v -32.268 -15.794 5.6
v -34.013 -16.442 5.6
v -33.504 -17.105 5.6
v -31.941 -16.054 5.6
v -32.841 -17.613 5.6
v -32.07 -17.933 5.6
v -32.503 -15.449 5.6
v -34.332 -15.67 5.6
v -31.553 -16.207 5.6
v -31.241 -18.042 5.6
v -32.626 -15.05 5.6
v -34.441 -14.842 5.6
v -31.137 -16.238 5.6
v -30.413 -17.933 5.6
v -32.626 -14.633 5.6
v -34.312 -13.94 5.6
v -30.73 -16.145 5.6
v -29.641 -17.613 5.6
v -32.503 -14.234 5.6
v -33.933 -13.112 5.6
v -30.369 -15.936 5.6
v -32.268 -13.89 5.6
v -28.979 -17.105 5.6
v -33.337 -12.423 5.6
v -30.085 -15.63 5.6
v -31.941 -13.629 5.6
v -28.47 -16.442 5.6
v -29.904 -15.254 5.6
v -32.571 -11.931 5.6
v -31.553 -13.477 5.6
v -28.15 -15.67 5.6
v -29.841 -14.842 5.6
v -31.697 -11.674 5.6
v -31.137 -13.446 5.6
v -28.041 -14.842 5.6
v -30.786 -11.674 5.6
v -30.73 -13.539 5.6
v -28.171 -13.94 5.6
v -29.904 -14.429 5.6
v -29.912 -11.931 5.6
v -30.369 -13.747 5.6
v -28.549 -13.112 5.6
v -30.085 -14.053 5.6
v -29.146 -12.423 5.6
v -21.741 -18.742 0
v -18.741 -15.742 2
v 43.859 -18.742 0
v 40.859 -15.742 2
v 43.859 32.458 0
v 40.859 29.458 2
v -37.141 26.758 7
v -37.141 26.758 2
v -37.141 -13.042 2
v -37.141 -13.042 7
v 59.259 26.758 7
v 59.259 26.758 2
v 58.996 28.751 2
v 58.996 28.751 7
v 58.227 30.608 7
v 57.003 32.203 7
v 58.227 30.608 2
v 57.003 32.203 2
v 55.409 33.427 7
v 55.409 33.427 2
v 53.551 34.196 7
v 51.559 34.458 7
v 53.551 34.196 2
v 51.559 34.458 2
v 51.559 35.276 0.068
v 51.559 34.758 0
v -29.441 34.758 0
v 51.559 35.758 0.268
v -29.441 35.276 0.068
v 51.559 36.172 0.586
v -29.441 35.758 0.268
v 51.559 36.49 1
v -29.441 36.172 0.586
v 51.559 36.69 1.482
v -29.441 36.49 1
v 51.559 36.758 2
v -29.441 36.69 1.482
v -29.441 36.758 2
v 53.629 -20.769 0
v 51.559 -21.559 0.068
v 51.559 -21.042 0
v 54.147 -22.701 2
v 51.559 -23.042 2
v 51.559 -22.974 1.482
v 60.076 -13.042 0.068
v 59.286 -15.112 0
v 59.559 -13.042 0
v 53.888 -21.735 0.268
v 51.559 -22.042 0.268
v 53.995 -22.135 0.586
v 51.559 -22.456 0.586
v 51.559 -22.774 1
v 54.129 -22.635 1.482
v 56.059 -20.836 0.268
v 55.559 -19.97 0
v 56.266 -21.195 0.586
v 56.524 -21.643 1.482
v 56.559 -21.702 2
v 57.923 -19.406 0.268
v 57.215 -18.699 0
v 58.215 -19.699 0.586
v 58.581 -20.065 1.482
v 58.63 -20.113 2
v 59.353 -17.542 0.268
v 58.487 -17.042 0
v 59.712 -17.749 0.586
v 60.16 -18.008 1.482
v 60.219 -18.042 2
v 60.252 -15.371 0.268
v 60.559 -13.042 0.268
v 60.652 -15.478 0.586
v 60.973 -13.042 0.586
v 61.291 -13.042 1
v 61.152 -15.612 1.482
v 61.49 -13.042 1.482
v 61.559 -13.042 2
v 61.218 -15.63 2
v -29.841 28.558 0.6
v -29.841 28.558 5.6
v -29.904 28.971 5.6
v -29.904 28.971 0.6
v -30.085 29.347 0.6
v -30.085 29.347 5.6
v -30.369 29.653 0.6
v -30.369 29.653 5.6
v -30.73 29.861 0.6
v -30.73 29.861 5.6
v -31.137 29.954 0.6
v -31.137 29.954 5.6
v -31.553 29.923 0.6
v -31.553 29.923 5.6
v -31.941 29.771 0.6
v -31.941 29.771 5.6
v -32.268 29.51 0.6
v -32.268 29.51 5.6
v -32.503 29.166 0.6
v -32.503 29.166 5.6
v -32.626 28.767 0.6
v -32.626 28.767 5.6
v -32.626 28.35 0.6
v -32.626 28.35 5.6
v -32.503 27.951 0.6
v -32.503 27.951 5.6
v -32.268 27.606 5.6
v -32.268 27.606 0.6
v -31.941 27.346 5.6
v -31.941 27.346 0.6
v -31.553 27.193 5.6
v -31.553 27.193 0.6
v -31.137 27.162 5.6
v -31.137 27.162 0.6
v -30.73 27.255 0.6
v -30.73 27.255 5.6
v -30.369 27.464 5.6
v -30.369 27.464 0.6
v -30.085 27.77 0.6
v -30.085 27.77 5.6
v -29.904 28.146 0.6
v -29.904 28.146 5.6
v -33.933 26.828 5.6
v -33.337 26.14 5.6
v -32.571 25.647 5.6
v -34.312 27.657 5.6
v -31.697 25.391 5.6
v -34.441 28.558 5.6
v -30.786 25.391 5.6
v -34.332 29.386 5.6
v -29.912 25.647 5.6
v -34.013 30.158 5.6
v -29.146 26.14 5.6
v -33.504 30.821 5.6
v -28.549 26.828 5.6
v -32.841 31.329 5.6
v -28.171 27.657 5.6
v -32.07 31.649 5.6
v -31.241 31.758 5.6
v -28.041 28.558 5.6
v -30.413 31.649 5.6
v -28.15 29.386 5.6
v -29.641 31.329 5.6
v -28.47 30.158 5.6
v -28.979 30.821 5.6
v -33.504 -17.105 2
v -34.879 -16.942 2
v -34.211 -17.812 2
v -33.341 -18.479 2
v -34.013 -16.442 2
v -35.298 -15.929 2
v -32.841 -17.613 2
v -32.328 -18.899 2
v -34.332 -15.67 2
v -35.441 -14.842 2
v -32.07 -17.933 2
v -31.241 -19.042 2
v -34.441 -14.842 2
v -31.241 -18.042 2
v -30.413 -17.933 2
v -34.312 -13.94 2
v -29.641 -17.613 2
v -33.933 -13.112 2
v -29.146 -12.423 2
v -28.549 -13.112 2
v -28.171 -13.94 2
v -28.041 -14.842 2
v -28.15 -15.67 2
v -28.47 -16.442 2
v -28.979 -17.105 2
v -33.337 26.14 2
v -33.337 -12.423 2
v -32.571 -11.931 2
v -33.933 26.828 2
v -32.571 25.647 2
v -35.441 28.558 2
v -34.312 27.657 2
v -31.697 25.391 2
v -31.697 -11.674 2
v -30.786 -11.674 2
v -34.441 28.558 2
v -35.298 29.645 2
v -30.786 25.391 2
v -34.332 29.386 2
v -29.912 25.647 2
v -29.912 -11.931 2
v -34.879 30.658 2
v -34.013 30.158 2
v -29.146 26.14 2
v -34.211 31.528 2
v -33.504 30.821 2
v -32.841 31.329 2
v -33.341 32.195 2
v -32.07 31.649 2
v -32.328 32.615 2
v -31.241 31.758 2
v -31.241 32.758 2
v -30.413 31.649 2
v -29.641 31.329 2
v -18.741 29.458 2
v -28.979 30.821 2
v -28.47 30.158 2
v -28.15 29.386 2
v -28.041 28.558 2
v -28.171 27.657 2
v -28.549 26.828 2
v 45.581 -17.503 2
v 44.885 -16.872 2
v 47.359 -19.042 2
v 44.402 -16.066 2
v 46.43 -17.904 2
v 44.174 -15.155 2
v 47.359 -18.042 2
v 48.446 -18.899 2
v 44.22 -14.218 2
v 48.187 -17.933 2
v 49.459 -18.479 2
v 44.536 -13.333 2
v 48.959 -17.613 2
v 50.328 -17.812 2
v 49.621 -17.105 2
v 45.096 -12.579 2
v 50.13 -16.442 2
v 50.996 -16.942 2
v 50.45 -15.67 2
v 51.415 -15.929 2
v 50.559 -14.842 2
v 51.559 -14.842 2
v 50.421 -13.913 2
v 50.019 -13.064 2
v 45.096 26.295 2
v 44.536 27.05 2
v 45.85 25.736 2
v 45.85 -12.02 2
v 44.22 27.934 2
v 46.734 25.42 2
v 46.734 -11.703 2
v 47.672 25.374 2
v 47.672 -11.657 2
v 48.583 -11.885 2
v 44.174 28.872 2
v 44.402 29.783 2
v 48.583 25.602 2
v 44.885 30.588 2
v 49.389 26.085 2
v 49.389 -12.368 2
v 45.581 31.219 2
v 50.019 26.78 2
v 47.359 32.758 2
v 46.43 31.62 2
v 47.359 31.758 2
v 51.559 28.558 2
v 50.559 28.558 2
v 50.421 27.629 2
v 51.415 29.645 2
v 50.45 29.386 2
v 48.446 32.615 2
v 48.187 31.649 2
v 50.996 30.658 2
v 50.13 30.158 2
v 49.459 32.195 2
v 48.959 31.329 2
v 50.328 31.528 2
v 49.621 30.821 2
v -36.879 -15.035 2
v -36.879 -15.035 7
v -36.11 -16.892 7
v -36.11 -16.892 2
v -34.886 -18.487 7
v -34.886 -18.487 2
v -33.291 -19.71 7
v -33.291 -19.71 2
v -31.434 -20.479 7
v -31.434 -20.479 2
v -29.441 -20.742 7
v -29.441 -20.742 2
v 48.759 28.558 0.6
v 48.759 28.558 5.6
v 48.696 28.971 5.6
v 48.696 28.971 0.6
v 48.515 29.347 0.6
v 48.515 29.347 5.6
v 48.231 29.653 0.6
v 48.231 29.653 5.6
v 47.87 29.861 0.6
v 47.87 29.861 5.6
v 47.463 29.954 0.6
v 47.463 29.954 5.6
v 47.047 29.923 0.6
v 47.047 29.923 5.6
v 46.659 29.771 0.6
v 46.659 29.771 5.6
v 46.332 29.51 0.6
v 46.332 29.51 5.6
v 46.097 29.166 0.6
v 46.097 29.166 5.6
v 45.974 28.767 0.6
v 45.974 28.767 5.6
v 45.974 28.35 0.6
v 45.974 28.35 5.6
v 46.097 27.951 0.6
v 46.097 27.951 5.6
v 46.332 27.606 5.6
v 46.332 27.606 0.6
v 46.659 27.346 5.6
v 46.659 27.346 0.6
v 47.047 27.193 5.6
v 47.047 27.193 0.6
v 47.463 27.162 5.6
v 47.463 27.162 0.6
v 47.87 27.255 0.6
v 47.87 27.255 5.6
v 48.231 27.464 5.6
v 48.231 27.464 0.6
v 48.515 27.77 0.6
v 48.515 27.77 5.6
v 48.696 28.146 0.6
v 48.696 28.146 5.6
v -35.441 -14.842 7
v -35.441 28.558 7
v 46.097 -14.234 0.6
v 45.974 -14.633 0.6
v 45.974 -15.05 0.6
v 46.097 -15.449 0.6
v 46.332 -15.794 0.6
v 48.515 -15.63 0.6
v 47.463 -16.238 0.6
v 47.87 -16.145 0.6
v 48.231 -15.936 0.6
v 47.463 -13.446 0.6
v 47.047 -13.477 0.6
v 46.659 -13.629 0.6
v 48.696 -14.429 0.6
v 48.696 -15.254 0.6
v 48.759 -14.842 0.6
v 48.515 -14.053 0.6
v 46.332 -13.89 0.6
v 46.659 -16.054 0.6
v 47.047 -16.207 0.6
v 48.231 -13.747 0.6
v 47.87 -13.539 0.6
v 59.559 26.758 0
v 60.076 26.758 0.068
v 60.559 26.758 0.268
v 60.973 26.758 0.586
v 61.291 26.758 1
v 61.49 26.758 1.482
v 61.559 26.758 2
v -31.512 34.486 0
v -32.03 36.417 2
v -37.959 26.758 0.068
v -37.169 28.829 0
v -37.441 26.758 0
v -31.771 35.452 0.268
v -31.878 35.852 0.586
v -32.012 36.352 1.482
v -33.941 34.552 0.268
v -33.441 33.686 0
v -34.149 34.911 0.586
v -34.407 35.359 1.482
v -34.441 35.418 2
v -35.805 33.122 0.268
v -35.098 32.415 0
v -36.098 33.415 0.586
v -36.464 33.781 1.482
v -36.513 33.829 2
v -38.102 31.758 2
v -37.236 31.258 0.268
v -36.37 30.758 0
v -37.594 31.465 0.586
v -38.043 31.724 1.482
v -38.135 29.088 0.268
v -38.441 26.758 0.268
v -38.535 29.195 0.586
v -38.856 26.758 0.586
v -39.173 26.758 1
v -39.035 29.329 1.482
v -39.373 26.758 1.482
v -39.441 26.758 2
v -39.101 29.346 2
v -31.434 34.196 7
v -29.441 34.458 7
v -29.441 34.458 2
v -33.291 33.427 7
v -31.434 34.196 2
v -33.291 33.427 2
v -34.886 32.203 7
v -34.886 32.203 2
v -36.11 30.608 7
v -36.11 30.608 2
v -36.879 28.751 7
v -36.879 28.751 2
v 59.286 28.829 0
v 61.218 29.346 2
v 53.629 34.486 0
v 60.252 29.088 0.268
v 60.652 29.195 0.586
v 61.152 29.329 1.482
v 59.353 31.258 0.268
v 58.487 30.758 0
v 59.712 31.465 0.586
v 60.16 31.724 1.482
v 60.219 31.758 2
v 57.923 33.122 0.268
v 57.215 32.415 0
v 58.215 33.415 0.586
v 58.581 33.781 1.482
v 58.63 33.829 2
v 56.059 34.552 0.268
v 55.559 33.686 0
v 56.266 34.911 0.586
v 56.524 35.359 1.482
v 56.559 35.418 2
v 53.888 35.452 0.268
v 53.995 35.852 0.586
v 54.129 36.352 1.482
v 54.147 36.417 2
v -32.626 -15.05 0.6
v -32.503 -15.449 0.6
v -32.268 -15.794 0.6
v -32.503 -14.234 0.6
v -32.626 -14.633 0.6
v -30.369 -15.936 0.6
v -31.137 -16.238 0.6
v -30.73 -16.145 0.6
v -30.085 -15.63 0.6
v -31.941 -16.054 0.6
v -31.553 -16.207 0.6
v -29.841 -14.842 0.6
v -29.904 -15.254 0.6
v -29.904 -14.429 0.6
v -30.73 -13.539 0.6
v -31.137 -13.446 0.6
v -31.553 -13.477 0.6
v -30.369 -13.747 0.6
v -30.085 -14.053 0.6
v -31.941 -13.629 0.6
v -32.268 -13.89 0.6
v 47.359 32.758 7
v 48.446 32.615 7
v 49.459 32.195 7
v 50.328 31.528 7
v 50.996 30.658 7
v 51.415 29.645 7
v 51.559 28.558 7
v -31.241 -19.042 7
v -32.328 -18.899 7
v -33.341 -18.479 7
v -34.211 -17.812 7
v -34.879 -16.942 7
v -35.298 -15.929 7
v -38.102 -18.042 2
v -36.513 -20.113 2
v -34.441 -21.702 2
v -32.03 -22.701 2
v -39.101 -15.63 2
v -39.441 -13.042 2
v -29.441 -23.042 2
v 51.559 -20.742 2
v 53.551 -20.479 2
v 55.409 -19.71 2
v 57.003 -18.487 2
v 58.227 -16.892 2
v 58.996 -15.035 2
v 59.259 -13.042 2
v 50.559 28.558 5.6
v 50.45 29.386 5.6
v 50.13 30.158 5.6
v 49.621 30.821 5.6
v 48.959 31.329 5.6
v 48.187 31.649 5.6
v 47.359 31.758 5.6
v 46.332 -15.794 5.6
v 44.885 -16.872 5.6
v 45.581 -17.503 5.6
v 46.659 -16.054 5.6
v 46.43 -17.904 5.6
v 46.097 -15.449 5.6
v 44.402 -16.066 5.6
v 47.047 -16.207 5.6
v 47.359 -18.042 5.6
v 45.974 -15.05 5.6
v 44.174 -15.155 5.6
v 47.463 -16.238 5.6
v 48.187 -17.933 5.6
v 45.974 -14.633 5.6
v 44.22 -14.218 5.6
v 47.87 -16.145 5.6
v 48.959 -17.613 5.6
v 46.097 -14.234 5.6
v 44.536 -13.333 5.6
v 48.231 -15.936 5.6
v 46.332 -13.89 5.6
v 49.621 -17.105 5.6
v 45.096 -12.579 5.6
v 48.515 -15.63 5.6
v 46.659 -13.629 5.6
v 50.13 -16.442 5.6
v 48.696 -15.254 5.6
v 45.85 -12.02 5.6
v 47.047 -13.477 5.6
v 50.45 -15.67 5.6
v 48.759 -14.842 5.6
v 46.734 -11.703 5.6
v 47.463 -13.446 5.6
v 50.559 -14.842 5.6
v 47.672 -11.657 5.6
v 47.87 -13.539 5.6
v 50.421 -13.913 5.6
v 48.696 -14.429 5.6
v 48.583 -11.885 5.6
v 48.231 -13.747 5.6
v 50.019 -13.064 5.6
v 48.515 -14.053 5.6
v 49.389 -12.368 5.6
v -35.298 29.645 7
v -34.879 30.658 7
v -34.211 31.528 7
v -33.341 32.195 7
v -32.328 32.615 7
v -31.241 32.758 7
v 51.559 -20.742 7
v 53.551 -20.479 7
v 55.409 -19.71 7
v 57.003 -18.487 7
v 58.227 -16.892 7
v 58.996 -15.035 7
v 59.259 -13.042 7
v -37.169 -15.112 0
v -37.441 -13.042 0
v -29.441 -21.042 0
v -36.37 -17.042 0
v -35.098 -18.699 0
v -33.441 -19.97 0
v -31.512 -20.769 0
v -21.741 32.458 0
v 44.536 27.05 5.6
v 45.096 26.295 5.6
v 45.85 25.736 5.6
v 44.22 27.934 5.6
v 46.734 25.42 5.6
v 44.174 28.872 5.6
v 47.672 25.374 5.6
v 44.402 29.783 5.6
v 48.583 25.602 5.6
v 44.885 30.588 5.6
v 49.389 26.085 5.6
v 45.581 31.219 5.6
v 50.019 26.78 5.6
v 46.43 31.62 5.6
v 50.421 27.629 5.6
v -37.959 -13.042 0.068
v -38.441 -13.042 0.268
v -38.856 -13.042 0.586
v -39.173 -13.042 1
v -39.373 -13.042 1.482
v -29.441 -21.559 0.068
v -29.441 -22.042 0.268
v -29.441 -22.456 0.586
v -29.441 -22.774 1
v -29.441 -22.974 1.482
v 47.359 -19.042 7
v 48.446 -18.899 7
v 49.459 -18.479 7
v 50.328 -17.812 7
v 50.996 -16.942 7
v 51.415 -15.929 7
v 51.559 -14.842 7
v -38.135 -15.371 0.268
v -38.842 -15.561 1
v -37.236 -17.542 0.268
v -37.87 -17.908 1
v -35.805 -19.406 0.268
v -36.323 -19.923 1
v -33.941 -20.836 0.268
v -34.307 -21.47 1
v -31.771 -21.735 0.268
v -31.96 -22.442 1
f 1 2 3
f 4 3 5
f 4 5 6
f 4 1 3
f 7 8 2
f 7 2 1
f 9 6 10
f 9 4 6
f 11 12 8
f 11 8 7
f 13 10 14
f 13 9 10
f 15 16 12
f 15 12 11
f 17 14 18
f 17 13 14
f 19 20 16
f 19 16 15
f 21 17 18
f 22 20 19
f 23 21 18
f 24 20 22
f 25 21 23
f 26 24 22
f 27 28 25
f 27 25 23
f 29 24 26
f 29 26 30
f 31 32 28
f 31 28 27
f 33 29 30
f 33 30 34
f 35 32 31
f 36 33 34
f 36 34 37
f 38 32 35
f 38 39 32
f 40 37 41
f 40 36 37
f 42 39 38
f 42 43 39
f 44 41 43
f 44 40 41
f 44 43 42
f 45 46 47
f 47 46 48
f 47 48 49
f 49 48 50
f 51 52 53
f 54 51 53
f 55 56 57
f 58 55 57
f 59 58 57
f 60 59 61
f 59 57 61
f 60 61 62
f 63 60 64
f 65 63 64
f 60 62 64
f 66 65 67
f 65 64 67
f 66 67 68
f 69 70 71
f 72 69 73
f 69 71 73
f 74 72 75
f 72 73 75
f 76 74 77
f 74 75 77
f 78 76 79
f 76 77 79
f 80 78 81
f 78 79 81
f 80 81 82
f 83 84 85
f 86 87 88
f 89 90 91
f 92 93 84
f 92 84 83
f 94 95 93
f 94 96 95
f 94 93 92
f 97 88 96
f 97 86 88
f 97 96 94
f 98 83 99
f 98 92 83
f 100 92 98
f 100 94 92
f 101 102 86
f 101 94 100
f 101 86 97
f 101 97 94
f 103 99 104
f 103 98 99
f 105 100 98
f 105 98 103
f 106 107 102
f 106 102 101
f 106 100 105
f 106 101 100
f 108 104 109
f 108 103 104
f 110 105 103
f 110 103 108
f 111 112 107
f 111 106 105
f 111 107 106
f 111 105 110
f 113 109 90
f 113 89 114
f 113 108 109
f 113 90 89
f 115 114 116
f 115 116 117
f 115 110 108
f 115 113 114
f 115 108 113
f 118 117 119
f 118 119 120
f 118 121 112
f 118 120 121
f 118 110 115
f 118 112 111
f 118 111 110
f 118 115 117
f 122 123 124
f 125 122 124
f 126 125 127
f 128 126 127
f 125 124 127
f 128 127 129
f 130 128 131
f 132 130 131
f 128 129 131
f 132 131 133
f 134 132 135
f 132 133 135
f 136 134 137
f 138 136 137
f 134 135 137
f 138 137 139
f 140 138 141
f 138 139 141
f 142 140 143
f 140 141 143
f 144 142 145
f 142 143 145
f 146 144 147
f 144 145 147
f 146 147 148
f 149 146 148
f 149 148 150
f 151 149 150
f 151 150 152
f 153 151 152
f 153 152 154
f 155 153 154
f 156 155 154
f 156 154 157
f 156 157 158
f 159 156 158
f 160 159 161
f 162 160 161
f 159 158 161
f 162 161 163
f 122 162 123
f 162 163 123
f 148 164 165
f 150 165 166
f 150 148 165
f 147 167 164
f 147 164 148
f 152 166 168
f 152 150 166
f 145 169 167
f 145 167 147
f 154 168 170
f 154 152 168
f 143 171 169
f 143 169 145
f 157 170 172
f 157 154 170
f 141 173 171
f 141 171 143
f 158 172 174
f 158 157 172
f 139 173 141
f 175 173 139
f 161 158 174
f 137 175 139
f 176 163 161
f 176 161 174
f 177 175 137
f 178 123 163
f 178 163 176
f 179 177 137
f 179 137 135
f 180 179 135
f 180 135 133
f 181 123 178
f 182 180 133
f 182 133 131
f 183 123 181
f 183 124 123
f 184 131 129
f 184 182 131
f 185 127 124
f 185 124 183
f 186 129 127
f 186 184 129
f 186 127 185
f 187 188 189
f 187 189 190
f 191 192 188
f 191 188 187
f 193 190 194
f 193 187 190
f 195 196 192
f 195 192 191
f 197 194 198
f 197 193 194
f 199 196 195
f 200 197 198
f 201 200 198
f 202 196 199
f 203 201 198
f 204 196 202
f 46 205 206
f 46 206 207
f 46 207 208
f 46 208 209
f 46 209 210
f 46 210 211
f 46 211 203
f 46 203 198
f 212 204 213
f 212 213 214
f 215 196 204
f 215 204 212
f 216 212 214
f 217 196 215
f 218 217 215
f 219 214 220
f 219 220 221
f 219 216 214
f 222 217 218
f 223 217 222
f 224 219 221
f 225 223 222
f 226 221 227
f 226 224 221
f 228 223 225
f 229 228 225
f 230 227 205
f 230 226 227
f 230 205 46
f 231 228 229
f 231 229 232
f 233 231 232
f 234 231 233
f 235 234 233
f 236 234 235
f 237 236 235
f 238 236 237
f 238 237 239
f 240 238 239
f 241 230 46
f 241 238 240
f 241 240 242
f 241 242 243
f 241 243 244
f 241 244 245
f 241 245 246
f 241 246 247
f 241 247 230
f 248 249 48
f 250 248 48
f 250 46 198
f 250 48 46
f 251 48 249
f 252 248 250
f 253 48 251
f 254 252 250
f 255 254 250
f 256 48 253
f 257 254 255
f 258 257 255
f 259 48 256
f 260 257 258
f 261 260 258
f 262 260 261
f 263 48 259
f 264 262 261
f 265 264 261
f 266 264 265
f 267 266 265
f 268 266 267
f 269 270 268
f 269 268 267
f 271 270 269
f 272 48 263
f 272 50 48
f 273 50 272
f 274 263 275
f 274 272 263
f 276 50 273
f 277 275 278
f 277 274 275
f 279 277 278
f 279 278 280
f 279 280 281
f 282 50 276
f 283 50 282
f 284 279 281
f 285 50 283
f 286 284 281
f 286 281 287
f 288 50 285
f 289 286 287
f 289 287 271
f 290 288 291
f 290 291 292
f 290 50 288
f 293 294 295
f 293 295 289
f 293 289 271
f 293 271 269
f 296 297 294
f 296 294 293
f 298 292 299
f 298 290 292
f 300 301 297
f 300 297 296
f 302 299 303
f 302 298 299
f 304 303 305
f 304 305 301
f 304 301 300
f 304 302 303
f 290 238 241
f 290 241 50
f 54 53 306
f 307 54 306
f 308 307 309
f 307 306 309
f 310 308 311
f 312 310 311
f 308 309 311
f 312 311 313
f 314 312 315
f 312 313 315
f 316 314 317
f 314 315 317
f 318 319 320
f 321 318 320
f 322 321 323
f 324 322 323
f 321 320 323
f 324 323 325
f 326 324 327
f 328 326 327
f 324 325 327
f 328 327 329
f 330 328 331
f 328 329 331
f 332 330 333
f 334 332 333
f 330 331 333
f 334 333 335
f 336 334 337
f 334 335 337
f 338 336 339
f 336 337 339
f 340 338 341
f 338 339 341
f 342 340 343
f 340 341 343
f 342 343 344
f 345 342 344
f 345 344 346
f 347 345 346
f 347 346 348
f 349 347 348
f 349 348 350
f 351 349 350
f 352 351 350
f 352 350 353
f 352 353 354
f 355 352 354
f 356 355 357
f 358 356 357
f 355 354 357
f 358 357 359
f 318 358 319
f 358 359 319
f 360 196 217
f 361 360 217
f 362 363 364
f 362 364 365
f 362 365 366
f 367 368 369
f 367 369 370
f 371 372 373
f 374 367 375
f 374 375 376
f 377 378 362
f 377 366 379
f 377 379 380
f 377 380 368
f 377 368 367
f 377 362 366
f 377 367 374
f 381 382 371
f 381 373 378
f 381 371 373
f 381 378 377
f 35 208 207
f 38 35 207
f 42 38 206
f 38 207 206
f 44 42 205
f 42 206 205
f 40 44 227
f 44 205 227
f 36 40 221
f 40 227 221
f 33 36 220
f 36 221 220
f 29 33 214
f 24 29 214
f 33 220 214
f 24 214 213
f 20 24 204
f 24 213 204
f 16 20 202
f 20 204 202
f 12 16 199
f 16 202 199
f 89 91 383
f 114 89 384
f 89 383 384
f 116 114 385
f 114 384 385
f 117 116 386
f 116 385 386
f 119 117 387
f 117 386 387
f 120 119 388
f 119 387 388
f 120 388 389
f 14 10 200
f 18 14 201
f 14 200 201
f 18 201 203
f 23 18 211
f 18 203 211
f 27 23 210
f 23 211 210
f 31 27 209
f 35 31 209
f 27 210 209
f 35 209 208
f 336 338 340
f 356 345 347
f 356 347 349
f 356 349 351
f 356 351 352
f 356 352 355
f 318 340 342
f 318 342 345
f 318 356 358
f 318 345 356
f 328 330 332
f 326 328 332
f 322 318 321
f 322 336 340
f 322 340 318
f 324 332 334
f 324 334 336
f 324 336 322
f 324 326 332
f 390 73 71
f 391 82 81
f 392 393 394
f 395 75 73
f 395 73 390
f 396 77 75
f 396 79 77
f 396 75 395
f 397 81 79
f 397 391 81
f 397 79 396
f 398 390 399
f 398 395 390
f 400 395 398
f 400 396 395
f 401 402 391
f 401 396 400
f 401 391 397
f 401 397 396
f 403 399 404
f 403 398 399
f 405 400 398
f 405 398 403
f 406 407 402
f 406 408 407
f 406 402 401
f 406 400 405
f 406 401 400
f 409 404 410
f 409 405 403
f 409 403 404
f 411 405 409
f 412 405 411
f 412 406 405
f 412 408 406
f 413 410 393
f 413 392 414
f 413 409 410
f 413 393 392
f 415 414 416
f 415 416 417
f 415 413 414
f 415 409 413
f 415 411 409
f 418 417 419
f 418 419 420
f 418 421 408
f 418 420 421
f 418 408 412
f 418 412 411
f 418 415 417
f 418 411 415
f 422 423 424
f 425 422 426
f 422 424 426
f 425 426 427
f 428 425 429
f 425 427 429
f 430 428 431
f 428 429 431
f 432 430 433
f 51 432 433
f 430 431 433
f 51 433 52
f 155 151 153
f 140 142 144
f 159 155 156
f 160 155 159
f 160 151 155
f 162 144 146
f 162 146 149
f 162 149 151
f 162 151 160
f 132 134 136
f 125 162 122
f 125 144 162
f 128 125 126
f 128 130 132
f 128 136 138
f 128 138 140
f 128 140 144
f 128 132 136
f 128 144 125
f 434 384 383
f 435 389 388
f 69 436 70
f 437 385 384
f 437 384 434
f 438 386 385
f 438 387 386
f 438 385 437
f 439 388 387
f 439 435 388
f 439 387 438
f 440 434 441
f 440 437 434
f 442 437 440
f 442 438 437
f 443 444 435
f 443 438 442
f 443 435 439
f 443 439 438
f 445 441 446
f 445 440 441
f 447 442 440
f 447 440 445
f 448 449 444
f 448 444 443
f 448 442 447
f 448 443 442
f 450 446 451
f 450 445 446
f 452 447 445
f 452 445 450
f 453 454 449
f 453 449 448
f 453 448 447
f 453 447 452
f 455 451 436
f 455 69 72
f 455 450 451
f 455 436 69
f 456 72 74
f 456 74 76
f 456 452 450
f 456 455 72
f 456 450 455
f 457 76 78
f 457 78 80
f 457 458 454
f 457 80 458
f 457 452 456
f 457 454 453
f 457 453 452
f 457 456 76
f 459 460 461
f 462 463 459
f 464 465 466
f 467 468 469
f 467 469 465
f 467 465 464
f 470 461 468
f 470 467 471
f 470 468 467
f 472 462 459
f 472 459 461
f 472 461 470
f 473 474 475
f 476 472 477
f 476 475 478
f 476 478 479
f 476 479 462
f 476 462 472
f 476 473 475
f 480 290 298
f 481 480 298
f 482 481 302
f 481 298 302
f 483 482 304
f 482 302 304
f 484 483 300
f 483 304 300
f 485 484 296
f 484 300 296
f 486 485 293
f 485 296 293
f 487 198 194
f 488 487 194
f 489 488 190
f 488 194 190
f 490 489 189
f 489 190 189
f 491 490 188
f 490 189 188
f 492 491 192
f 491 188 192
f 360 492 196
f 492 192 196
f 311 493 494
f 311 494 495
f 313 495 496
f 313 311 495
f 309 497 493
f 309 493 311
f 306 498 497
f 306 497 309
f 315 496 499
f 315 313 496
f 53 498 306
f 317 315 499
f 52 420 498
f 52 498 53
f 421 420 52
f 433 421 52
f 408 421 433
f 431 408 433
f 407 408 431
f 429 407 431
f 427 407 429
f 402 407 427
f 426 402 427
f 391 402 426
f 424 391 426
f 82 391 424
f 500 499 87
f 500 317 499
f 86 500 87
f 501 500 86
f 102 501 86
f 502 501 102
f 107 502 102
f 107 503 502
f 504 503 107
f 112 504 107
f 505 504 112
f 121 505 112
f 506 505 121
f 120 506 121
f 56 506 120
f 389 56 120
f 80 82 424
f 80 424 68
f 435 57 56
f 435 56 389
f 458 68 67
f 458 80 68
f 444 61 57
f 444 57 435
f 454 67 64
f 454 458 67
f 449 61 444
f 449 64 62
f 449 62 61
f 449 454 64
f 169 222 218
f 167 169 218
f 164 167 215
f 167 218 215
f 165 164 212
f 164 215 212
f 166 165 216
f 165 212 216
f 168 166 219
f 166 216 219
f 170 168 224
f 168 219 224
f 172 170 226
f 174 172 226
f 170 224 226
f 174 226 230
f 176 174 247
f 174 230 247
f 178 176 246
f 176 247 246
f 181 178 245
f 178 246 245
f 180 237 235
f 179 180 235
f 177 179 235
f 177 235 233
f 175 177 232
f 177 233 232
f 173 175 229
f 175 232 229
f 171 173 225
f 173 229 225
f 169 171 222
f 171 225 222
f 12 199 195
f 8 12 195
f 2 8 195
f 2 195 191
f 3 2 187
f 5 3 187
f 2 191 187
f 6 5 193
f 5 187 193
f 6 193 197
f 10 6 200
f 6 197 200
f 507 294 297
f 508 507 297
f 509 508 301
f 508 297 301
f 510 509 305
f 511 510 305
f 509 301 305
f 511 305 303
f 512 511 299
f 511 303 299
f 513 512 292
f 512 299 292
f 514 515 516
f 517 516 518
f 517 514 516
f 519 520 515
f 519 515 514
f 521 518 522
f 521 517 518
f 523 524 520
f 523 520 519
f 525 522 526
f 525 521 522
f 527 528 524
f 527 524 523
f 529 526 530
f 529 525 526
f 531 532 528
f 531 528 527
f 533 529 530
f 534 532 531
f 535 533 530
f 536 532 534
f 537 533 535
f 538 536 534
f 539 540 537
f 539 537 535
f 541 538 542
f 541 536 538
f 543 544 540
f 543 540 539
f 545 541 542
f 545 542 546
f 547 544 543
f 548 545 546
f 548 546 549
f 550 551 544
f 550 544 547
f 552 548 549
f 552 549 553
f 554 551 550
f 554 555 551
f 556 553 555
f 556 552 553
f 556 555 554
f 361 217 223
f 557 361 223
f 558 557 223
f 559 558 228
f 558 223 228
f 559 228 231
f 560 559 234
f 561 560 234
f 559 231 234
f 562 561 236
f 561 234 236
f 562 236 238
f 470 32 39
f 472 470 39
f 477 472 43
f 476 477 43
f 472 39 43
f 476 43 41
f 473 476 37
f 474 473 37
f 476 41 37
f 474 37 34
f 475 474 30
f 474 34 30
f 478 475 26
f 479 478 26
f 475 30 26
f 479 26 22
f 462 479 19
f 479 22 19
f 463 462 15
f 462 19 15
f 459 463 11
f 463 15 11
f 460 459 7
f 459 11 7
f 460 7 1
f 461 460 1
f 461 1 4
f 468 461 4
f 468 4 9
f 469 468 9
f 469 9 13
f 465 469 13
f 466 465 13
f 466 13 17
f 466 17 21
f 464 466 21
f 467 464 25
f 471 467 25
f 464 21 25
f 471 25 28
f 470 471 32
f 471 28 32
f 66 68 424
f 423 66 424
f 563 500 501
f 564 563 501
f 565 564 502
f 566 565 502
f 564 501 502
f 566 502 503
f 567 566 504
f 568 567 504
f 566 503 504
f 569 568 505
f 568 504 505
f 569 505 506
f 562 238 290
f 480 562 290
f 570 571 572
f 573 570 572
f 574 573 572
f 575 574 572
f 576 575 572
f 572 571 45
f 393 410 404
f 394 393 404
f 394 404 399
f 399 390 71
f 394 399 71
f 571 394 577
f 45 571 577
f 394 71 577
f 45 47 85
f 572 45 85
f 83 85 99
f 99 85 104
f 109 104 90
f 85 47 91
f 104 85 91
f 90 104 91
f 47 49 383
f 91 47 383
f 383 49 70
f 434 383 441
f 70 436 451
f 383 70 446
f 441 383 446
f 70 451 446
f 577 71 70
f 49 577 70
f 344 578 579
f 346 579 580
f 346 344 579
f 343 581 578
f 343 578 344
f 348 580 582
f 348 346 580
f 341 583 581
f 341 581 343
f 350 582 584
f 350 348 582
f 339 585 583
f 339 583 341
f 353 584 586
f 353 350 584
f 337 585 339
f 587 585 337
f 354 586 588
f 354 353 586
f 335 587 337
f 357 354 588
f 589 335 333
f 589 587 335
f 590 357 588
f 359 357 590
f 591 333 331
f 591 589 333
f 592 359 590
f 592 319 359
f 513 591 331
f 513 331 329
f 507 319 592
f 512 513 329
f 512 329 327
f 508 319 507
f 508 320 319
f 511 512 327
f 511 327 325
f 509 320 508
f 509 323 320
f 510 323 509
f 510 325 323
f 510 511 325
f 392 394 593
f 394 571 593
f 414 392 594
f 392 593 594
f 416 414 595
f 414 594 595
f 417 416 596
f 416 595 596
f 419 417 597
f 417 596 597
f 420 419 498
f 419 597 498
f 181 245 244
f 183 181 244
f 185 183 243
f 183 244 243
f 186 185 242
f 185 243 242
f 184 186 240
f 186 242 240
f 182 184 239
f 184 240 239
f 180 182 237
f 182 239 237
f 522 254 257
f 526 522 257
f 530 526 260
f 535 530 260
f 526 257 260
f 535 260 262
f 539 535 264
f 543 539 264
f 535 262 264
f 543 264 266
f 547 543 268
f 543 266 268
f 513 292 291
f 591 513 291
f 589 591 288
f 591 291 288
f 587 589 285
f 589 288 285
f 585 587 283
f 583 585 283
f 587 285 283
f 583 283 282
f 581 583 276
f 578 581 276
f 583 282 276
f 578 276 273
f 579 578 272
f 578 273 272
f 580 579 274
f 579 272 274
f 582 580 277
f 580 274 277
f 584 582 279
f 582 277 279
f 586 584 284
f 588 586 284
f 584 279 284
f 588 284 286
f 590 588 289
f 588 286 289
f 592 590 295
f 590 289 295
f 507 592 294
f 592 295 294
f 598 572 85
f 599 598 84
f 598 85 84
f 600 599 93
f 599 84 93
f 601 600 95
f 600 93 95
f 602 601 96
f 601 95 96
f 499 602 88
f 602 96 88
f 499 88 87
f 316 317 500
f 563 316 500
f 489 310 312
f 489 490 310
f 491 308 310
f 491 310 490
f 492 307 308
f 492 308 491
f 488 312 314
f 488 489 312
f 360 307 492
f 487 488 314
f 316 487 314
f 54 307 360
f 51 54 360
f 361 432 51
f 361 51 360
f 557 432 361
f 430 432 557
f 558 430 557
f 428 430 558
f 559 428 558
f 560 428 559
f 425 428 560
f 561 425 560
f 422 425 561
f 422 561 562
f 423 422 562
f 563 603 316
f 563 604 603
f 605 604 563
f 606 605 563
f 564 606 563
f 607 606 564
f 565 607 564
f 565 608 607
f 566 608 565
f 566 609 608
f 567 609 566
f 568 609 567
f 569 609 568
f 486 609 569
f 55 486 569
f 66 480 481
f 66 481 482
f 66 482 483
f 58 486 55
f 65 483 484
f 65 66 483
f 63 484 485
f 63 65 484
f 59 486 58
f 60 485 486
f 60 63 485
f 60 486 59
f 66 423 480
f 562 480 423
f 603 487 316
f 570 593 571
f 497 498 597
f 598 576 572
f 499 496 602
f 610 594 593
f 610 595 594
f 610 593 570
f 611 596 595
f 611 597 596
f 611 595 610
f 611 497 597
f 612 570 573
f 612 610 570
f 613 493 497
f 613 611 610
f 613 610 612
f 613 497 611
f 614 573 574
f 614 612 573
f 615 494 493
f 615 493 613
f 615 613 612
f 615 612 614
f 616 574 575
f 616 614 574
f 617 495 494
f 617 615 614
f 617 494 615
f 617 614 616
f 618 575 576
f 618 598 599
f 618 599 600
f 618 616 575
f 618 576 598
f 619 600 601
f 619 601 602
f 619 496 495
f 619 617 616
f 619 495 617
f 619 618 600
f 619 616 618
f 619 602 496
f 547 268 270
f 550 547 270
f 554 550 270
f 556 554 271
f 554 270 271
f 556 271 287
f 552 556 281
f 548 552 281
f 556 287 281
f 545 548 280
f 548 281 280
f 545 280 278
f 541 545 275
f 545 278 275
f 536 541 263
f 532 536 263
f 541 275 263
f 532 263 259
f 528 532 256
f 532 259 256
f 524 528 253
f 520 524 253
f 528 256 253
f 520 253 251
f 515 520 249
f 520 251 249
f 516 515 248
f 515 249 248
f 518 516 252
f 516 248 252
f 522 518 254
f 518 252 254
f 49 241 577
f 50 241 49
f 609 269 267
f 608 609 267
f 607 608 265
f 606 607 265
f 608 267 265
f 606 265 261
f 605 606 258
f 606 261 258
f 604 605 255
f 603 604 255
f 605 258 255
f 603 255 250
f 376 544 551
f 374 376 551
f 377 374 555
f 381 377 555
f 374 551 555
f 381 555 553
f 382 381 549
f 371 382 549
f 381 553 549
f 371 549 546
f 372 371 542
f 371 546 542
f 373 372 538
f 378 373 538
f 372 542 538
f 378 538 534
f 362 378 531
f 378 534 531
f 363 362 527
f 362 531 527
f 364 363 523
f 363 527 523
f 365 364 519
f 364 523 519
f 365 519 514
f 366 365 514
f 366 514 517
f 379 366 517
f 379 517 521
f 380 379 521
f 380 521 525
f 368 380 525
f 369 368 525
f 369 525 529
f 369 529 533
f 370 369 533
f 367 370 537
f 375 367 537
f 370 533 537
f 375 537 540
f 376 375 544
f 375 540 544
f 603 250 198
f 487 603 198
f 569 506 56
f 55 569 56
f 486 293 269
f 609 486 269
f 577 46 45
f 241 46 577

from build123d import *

# Parameters (mm, degrees)
F1_DEPTH = 5.6
F2_DEPTH = 7
F0_W     = 59.6
F0_H     = 45.2
F3_DEPTH = 2
F4_R     = 1.99999
F5_SIZE2 = 1.99999
F5_SIZE  = 2.99999
F6_R     = 1.4
F7_DEPTH = 5


# Not quite as in the source:
# - a fillet or chamfer is up to 0.001 mm smaller than in the source, because OpenCascade refuses the exact size


with BuildPart() as f1:
    # F0 (on Top) → F1 (new body)
    with BuildSketch(Plane.XY):
        with BuildLine():
            ThreePointArc((-34.4414402544, 28.5581715763), (-31.2414402544, 25.3581715763), (-28.0414402544, 28.5581715763))
            ThreePointArc((-28.0414402544, 28.5581715763), (-28.9786985547, 30.8209132761), (-31.2414402544, 31.7581715763))
            ThreePointArc((-31.2414402544, 31.7581715763), (-33.5041819542, 30.8209132761), (-34.4414402544, 28.5581715763))
        make_face()
    extrude(amount=F1_DEPTH)



with BuildPart() as f1b:
    # F0 (on Top) → F1, piece 2 (new body)
    with BuildSketch(Plane.XY):
        with BuildLine():
            ThreePointArc((-28.0414402544, -14.8418284237), (-31.2414402544, -11.6418284237), (-34.4414402544, -14.8418284237))
            ThreePointArc((-34.4414402544, -14.8418284237), (-33.5041819542, -17.1045701235), (-31.2414402544, -18.0418284237))
            ThreePointArc((-31.2414402544, -18.0418284237), (-28.9786985547, -17.1045701235), (-28.0414402544, -14.8418284237))
        make_face()
    extrude(amount=F1_DEPTH)


with BuildPart() as f1c:
    # F0 (on Top) → F1, piece 3 (new body)
    with BuildSketch(Plane.XY):
        with BuildLine():
            ThreePointArc((47.3585597456, -18.0418284237), (49.6213014453, -17.1045701235), (50.5585597456, -14.8418284237))
            ThreePointArc((50.5585597456, -14.8418284237), (45.0958180458, -12.5790867239), (47.3585597456, -18.0418284237))
        make_face()
    extrude(amount=F1_DEPTH)


with BuildPart() as f1d:
    # F0 (on Top) → F1, piece 4 (new body)
    with BuildSketch(Plane.XY):
        with BuildLine():
            ThreePointArc((50.5585597456, 28.5581715763), (49.6213014453, 30.8209132761), (47.3585597456, 31.7581715763))
            ThreePointArc((47.3585597456, 31.7581715763), (45.0958180458, 26.2954298765), (50.5585597456, 28.5581715763))
        make_face()
    extrude(amount=F1_DEPTH)


with BuildPart() as f2:
    # F0 (on Top) → F2 (new body)
    with BuildSketch(Plane.XY):
        with BuildLine():
            Line((51.5585597456, 34.4581715763), (-29.4414402544, 34.4581715763))
            ThreePointArc((-29.4414402544, 34.4581715763), (-34.8861624696, 32.2028937914), (-37.1414402544, 26.7581715763))
            Line((-37.1414402544, 26.7581715763), (-37.1414402544, -13.0418284237))
            ThreePointArc((-37.1414402544, -13.0418284237), (-34.8861624696, -18.4865506389), (-29.4414402544, -20.7418284237))
            Line((-29.4414402544, -20.7418284237), (51.5585597456, -20.7418284237))
            ThreePointArc((51.5585597456, -20.7418284237), (57.0032819607, -18.4865506389), (59.2585597456, -13.0418284237))
            Line((59.2585597456, -13.0418284237), (59.2585597456, 26.7581715763))
            ThreePointArc((59.2585597456, 26.7581715763), (57.0032819607, 32.2028937914), (51.5585597456, 34.4581715763))
        make_face()
        with BuildLine():
            ThreePointArc((47.3585597456, 32.7581715763), (50.3284082265, 31.5280200572), (51.5585597456, 28.5581715763))
            Line((51.5585597456, 28.5581715763), (51.5585597456, -14.8418284237))
            ThreePointArc((51.5585597456, -14.8418284237), (50.3284082265, -17.8116769047), (47.3585597456, -19.0418284237))
            Line((47.3585597456, -19.0418284237), (-31.2414402544, -19.0418284237))
            ThreePointArc((-31.2414402544, -19.0418284237), (-34.2112887354, -17.8116769047), (-35.4414402544, -14.8418284237))
            Line((-35.4414402544, -14.8418284237), (-35.4414402544, 28.5581715763))
            ThreePointArc((-35.4414402544, 28.5581715763), (-34.2112887354, 31.5280200572), (-31.2414402544, 32.7581715763))
            Line((-31.2414402544, 32.7581715763), (47.3585597456, 32.7581715763))
        make_face(mode=Mode.SUBTRACT)
    extrude(amount=F2_DEPTH)


with BuildPart() as f1_1:
    add(f1.part)

    add(f1b.part)  # F3 merges F1b

    add(f1c.part)  # F3 merges F1c

    add(f1d.part)  # F3 merges F1d

    add(f2.part)  # F3 merges F2
    # F0 (on Top) → F3 (join)
    with BuildSketch(Plane.XY):
        with BuildLine():
            Line((51.5585597456, 36.7581715763), (-29.4414402544, 36.7581715763))
            ThreePointArc((-29.4414402544, 36.7581715763), (-36.5125080663, 33.8292393881), (-39.4414402544, 26.7581715763))
            Line((-39.4414402544, 26.7581715763), (-39.4414402544, -13.0418284237))
            ThreePointArc((-39.4414402544, -13.0418284237), (-36.5125080663, -20.1128962356), (-29.4414402544, -23.0418284237))
            Line((-29.4414402544, -23.0418284237), (51.5585597456, -23.0418284237))
            ThreePointArc((51.5585597456, -23.0418284237), (58.6296275574, -20.1128962356), (61.5585597456, -13.0418284237))
            Line((61.5585597456, -13.0418284237), (61.5585597456, 26.7581715763))
            ThreePointArc((61.5585597456, 26.7581715763), (58.6296275574, 33.8292393881), (51.5585597456, 36.7581715763))
        make_face()
        with BuildLine():
            ThreePointArc((-37.1414402544, 26.7581715763), (-34.8861624696, 32.2028937914), (-29.4414402544, 34.4581715763))
            Line((-29.4414402544, 34.4581715763), (51.5585597456, 34.4581715763))
            ThreePointArc((51.5585597456, 34.4581715763), (57.0032819607, 32.2028937914), (59.2585597456, 26.7581715763))
            Line((59.2585597456, 26.7581715763), (59.2585597456, -13.0418284237))
            ThreePointArc((59.2585597456, -13.0418284237), (57.0032819607, -18.4865506389), (51.5585597456, -20.7418284237))
            Line((51.5585597456, -20.7418284237), (-29.4414402544, -20.7418284237))
            ThreePointArc((-29.4414402544, -20.7418284237), (-34.8861624696, -18.4865506389), (-37.1414402544, -13.0418284237))
            Line((-37.1414402544, -13.0418284237), (-37.1414402544, 26.7581715763))
        make_face(mode=Mode.SUBTRACT)
        with BuildLine():
            Line((51.5585597456, -14.8418284237), (51.5585597456, 28.5581715763))
            ThreePointArc((51.5585597456, 28.5581715763), (50.3284082265, 31.5280200572), (47.3585597456, 32.7581715763))
            Line((47.3585597456, 32.7581715763), (-31.2414402544, 32.7581715763))
            ThreePointArc((-31.2414402544, 32.7581715763), (-34.2112887354, 31.5280200572), (-35.4414402544, 28.5581715763))
            Line((-35.4414402544, 28.5581715763), (-35.4414402544, -14.8418284237))
            ThreePointArc((-35.4414402544, -14.8418284237), (-34.2112887354, -17.8116769047), (-31.2414402544, -19.0418284237))
            Line((-31.2414402544, -19.0418284237), (47.3585597456, -19.0418284237))
            ThreePointArc((47.3585597456, -19.0418284237), (50.3284082265, -17.8116769047), (51.5585597456, -14.8418284237))
        make_face()
        with BuildLine():
            ThreePointArc((-34.4414402544, 28.5581715763), (-33.5041819542, 30.8209132761), (-31.2414402544, 31.7581715763))
            Line((-31.2414402544, 31.7581715763), (47.3585597456, 31.7581715763))
            ThreePointArc((47.3585597456, 31.7581715763), (49.6213014453, 30.8209132761), (50.5585597456, 28.5581715763))
            Line((50.5585597456, 28.5581715763), (50.5585597456, -14.8418284237))
            ThreePointArc((50.5585597456, -14.8418284237), (49.6213014453, -17.1045701235), (47.3585597456, -18.0418284237))
            Line((47.3585597456, -18.0418284237), (-31.2414402544, -18.0418284237))
            ThreePointArc((-31.2414402544, -18.0418284237), (-33.5041819542, -17.1045701235), (-34.4414402544, -14.8418284237))
            Line((-34.4414402544, -14.8418284237), (-34.4414402544, 28.5581715763))
        make_face(mode=Mode.SUBTRACT)
        with BuildLine():
            ThreePointArc((-31.2414402544, 31.7581715763), (-28.9786985547, 30.8209132761), (-28.0414402544, 28.5581715763))
            ThreePointArc((-28.0414402544, 28.5581715763), (-31.2414402544, 25.3581715763), (-34.4414402544, 28.5581715763))
            Line((-34.4414402544, 28.5581715763), (-34.4414402544, -14.8418284237))
            ThreePointArc((-34.4414402544, -14.8418284237), (-31.2414402544, -11.6418284237), (-28.0414402544, -14.8418284237))
            ThreePointArc((-28.0414402544, -14.8418284237), (-28.9786985547, -17.1045701235), (-31.2414402544, -18.0418284237))
            Line((-31.2414402544, -18.0418284237), (47.3585597456, -18.0418284237))
            ThreePointArc((47.3585597456, -18.0418284237), (45.0958180458, -12.5790867239), (50.5585597456, -14.8418284237))
            Line((50.5585597456, -14.8418284237), (50.5585597456, 28.5581715763))
            ThreePointArc((50.5585597456, 28.5581715763), (45.0958180458, 26.2954298765), (47.3585597456, 31.7581715763))
            Line((47.3585597456, 31.7581715763), (-31.2414402544, 31.7581715763))
        make_face()
        with Locations((11.0585597456, 6.8581715763)):
            Rectangle(F0_W, F0_H, mode=Mode.SUBTRACT)
    extrude(amount=F3_DEPTH)

    # F4 (radius 2 in the source; OpenCascade refuses exactly that, so slightly less here)
    f4_edges = [f1_1.edges().sort_by_distance(p)[0] for p in [
        (-36.512508, -20.112896, 0),
    ]]
    fillet(f4_edges, radius=F4_R)

    # F5 (size 3 and 2 in the source; OpenCascade refuses exactly that, so slightly less here)
    f5_edges = [f1_1.edges().sort_by_distance(p)[0] for p in [
        (11.05856, 29.458172, 0),
        (-18.74144, 6.858172, 0),
        (11.05856, -15.741828, 0),
        (40.85856, 6.858172, 0),
    ]]
    f5_side = f1_1.faces().sort_by_distance((-34.307016, -17.907405, 0))[0]
    chamfer(f5_edges, length=F5_SIZE, length2=F5_SIZE2, reference=f5_side)

    # F6 (on face) → F7 (cut)
    with BuildSketch(Plane.XY.offset(5.6)):
        with Locations((-31.2414402544, 28.5581715763)):
            Circle(F6_R)
        with Locations((-31.2414402544, -14.8418284237)):
            Circle(F6_R)
        with Locations((47.3585597456, -14.8418284237)):
            Circle(F6_R)
        with Locations((47.3585597456, 28.5581715763)):
            Circle(F6_R)
    extrude(amount=-F7_DEPTH, mode=Mode.SUBTRACT)


solid = f1_1.part
